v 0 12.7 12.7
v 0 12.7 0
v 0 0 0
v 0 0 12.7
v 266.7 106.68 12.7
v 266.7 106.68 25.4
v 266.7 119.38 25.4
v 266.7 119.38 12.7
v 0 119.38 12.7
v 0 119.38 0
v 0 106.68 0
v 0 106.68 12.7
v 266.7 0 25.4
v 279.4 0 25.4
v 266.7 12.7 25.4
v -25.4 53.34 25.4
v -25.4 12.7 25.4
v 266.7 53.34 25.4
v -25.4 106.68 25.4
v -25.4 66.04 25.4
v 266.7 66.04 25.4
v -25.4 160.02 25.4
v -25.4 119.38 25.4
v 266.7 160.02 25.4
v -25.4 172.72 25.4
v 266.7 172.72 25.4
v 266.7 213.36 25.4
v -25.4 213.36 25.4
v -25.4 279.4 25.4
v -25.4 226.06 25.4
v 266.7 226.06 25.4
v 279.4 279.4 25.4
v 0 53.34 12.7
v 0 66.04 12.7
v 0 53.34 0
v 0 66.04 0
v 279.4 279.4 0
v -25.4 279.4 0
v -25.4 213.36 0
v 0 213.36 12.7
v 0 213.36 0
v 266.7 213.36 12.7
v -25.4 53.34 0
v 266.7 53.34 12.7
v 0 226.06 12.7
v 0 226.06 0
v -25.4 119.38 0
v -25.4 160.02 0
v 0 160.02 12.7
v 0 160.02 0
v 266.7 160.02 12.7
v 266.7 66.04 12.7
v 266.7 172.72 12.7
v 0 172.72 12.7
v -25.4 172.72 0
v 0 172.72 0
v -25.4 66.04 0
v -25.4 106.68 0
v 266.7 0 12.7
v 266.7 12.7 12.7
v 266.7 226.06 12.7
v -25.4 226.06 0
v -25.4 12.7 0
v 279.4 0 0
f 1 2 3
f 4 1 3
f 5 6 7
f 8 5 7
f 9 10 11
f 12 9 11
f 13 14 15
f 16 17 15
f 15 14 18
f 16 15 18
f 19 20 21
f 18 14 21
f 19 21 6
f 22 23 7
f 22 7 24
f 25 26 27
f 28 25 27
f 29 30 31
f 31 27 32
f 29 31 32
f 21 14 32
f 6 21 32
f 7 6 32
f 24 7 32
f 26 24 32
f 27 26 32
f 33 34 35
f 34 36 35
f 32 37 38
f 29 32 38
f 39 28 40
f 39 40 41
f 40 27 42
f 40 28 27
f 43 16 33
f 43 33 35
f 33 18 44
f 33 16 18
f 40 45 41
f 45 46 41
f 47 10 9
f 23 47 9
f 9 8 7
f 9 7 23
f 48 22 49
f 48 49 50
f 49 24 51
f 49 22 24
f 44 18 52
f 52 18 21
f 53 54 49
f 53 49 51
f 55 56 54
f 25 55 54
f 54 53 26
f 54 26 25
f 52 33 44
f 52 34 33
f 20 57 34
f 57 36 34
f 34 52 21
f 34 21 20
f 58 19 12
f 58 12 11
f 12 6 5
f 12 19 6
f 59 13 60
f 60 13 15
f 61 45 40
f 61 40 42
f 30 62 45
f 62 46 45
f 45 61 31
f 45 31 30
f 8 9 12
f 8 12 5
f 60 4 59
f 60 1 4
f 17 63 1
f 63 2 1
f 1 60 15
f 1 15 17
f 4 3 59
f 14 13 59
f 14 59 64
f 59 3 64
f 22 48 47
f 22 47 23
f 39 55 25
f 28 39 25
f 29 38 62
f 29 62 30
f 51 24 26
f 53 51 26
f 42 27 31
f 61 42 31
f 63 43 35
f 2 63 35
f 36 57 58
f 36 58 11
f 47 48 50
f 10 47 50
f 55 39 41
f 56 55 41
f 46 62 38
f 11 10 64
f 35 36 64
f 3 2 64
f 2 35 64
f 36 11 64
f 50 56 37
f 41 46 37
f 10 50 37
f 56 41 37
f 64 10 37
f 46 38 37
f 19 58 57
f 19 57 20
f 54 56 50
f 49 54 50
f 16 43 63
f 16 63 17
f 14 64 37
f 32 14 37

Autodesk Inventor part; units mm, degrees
ref_plane "YZ Plane" through (0, 0, 0) normal (1, 0, 0) x (0, 1, 0)
ref_plane "XZ Plane" through (0, 0, 0) normal (0, 1, 0) x (-1, 0, 0)
ref_plane "XY Plane" through (0, 0, 0) normal (0, 0, 1) x (1, 0, 0)
sketch "Sketch1" plane through (0, 0, 0) normal (0, 0, 1) x (1, 0, 0)
  line L0 (0, 0) -> (279.4, 0)
  line L1 (279.4, 0) -> (279.4, 279.4)
  line L2 (279.4, 279.4) -> (0, 279.4)
  line L3 (0, 279.4) -> (0, 0)
  dimension "d0" = 279.4
  dimension "d1" = 279.4
extrude "Extrusion1" add sketch "Sketch1" along normal blind 25.4
sketch "Sketch2" plane through (0, 0, 25.4) normal (0, 0, 1) x (1, 0, 0)
  line L0 (0, 279.4) -> (0, 0) projected
  line L1 (0, 213.36) -> (266.7, 213.36)
  line L2 (266.7, 213.36) -> (266.7, 226.06)
  line L3 (266.7, 226.06) -> (0, 226.06)
  line L4 (0, 226.06) -> (0, 213.36)
  line L5 (279.4, 279.4) -> (0, 279.4) projected
  line L6 (0, 106.68) -> (266.7, 106.68)
  line L7 (266.7, 106.68) -> (266.7, 119.38)
  line L8 (266.7, 119.38) -> (0, 119.38)
  line L9 (0, 119.38) -> (0, 106.68)
  line L10 (0, 0) -> (266.7, 0)
  line L11 (266.7, 0) -> (266.7, 12.7)
  line L12 (266.7, 12.7) -> (0, 12.7)
  line L13 (0, 12.7) -> (0, 0)
  line L14 (0, 53.34) -> (266.7, 53.34)
  line L15 (266.7, 53.34) -> (266.7, 66.04)
  line L16 (266.7, 66.04) -> (0, 66.04)
  line L17 (0, 66.04) -> (0, 53.34)
  line L18 (0, 160.02) -> (266.7, 160.02)
  line L19 (266.7, 160.02) -> (266.7, 172.72)
  line L20 (266.7, 172.72) -> (0, 172.72)
  line L21 (0, 172.72) -> (0, 160.02)
  point P0 (0, 226.06)
  point P1 (0, 172.72)
  point P2 (0, 119.38)
  point P3 (0, 66.04)
  point P4 (0, 12.7)
  dimension "d4" = 266.7
  dimension "d5" = 12.7
  dimension "d6" = 53.34
  dimension "d7" = 266.7
  dimension "d8" = 0
  dimension "d9" = 0
  dimension "d10" = 0
  dimension "d11" = 0
  dimension "d12" = 266.7
  dimension "d13" = 266.7
  dimension "d14" = 266.7
  dimension "d15" = 12.7
  dimension "d16" = 40.64
  dimension "d17" = 12.7
  dimension "d18" = 40.64
  dimension "d19" = 12.7
  dimension "d20" = 12.7
  dimension "d21" = 40.64
  dimension "d22" = 40.64
extrude "Extrusion2" cut sketch "Sketch2" against normal blind 12.7
sketch "Sketch3" plane through (0, 0, 0) normal (-1, 0, 0) x (0, 0, 1)
  line L0 (0, 279.4) -> (0, 0) projected
  line L1 (12.7, 226.06) -> (25.4, 226.06) projected
  line L2 (0, 279.4) -> (25.4, 279.4)
  line L3 (25.4, 279.4) -> (25.4, 226.06)
  line L4 (25.4, 226.06) -> (0, 226.06)
  line L5 (0, 226.06) -> (0, 279.4)
  line L6 (25.4, 213.36) -> (12.7, 213.36) projected
  line L7 (25.4, 213.36) -> (0, 213.36)
  line L8 (0, 213.36) -> (0, 172.72)
  line L9 (0, 172.72) -> (25.4, 172.72)
  line L10 (25.4, 172.72) -> (25.4, 213.36)
  line L11 (25.4, 160.02) -> (25.4, 119.38) projected
  line L12 (25.4, 160.02) -> (0, 160.02)
  line L13 (0, 160.02) -> (0, 119.38)
  line L14 (0, 119.38) -> (25.4, 119.38)
  line L15 (25.4, 119.38) -> (25.4, 160.02)
  line L16 (25.4, 106.68) -> (25.4, 66.04) projected
  line L17 (25.4, 106.68) -> (0, 106.68)
  line L18 (0, 106.68) -> (0, 66.04)
  line L19 (0, 66.04) -> (25.4, 66.04)
  line L20 (25.4, 66.04) -> (25.4, 106.68)
  line L21 (25.4, 53.34) -> (12.7, 53.34) projected
  line L22 (25.4, 53.34) -> (0, 53.34)
  line L23 (0, 53.34) -> (0, 12.7)
  line L24 (0, 12.7) -> (25.4, 12.7)
  line L25 (25.4, 12.7) -> (25.4, 53.34)
  dimension "d25" = 40.64
  dimension "d26" = 25.4
  dimension "d27" = 40.64
  dimension "d28" = 25.4
  dimension "d29" = 40.64
  dimension "d30" = 25.4
  dimension "d31" = 40.64
extrude "Extrusion3" add sketch "Sketch3" along normal blind 25.4
properties part number "NewBackPlate"
